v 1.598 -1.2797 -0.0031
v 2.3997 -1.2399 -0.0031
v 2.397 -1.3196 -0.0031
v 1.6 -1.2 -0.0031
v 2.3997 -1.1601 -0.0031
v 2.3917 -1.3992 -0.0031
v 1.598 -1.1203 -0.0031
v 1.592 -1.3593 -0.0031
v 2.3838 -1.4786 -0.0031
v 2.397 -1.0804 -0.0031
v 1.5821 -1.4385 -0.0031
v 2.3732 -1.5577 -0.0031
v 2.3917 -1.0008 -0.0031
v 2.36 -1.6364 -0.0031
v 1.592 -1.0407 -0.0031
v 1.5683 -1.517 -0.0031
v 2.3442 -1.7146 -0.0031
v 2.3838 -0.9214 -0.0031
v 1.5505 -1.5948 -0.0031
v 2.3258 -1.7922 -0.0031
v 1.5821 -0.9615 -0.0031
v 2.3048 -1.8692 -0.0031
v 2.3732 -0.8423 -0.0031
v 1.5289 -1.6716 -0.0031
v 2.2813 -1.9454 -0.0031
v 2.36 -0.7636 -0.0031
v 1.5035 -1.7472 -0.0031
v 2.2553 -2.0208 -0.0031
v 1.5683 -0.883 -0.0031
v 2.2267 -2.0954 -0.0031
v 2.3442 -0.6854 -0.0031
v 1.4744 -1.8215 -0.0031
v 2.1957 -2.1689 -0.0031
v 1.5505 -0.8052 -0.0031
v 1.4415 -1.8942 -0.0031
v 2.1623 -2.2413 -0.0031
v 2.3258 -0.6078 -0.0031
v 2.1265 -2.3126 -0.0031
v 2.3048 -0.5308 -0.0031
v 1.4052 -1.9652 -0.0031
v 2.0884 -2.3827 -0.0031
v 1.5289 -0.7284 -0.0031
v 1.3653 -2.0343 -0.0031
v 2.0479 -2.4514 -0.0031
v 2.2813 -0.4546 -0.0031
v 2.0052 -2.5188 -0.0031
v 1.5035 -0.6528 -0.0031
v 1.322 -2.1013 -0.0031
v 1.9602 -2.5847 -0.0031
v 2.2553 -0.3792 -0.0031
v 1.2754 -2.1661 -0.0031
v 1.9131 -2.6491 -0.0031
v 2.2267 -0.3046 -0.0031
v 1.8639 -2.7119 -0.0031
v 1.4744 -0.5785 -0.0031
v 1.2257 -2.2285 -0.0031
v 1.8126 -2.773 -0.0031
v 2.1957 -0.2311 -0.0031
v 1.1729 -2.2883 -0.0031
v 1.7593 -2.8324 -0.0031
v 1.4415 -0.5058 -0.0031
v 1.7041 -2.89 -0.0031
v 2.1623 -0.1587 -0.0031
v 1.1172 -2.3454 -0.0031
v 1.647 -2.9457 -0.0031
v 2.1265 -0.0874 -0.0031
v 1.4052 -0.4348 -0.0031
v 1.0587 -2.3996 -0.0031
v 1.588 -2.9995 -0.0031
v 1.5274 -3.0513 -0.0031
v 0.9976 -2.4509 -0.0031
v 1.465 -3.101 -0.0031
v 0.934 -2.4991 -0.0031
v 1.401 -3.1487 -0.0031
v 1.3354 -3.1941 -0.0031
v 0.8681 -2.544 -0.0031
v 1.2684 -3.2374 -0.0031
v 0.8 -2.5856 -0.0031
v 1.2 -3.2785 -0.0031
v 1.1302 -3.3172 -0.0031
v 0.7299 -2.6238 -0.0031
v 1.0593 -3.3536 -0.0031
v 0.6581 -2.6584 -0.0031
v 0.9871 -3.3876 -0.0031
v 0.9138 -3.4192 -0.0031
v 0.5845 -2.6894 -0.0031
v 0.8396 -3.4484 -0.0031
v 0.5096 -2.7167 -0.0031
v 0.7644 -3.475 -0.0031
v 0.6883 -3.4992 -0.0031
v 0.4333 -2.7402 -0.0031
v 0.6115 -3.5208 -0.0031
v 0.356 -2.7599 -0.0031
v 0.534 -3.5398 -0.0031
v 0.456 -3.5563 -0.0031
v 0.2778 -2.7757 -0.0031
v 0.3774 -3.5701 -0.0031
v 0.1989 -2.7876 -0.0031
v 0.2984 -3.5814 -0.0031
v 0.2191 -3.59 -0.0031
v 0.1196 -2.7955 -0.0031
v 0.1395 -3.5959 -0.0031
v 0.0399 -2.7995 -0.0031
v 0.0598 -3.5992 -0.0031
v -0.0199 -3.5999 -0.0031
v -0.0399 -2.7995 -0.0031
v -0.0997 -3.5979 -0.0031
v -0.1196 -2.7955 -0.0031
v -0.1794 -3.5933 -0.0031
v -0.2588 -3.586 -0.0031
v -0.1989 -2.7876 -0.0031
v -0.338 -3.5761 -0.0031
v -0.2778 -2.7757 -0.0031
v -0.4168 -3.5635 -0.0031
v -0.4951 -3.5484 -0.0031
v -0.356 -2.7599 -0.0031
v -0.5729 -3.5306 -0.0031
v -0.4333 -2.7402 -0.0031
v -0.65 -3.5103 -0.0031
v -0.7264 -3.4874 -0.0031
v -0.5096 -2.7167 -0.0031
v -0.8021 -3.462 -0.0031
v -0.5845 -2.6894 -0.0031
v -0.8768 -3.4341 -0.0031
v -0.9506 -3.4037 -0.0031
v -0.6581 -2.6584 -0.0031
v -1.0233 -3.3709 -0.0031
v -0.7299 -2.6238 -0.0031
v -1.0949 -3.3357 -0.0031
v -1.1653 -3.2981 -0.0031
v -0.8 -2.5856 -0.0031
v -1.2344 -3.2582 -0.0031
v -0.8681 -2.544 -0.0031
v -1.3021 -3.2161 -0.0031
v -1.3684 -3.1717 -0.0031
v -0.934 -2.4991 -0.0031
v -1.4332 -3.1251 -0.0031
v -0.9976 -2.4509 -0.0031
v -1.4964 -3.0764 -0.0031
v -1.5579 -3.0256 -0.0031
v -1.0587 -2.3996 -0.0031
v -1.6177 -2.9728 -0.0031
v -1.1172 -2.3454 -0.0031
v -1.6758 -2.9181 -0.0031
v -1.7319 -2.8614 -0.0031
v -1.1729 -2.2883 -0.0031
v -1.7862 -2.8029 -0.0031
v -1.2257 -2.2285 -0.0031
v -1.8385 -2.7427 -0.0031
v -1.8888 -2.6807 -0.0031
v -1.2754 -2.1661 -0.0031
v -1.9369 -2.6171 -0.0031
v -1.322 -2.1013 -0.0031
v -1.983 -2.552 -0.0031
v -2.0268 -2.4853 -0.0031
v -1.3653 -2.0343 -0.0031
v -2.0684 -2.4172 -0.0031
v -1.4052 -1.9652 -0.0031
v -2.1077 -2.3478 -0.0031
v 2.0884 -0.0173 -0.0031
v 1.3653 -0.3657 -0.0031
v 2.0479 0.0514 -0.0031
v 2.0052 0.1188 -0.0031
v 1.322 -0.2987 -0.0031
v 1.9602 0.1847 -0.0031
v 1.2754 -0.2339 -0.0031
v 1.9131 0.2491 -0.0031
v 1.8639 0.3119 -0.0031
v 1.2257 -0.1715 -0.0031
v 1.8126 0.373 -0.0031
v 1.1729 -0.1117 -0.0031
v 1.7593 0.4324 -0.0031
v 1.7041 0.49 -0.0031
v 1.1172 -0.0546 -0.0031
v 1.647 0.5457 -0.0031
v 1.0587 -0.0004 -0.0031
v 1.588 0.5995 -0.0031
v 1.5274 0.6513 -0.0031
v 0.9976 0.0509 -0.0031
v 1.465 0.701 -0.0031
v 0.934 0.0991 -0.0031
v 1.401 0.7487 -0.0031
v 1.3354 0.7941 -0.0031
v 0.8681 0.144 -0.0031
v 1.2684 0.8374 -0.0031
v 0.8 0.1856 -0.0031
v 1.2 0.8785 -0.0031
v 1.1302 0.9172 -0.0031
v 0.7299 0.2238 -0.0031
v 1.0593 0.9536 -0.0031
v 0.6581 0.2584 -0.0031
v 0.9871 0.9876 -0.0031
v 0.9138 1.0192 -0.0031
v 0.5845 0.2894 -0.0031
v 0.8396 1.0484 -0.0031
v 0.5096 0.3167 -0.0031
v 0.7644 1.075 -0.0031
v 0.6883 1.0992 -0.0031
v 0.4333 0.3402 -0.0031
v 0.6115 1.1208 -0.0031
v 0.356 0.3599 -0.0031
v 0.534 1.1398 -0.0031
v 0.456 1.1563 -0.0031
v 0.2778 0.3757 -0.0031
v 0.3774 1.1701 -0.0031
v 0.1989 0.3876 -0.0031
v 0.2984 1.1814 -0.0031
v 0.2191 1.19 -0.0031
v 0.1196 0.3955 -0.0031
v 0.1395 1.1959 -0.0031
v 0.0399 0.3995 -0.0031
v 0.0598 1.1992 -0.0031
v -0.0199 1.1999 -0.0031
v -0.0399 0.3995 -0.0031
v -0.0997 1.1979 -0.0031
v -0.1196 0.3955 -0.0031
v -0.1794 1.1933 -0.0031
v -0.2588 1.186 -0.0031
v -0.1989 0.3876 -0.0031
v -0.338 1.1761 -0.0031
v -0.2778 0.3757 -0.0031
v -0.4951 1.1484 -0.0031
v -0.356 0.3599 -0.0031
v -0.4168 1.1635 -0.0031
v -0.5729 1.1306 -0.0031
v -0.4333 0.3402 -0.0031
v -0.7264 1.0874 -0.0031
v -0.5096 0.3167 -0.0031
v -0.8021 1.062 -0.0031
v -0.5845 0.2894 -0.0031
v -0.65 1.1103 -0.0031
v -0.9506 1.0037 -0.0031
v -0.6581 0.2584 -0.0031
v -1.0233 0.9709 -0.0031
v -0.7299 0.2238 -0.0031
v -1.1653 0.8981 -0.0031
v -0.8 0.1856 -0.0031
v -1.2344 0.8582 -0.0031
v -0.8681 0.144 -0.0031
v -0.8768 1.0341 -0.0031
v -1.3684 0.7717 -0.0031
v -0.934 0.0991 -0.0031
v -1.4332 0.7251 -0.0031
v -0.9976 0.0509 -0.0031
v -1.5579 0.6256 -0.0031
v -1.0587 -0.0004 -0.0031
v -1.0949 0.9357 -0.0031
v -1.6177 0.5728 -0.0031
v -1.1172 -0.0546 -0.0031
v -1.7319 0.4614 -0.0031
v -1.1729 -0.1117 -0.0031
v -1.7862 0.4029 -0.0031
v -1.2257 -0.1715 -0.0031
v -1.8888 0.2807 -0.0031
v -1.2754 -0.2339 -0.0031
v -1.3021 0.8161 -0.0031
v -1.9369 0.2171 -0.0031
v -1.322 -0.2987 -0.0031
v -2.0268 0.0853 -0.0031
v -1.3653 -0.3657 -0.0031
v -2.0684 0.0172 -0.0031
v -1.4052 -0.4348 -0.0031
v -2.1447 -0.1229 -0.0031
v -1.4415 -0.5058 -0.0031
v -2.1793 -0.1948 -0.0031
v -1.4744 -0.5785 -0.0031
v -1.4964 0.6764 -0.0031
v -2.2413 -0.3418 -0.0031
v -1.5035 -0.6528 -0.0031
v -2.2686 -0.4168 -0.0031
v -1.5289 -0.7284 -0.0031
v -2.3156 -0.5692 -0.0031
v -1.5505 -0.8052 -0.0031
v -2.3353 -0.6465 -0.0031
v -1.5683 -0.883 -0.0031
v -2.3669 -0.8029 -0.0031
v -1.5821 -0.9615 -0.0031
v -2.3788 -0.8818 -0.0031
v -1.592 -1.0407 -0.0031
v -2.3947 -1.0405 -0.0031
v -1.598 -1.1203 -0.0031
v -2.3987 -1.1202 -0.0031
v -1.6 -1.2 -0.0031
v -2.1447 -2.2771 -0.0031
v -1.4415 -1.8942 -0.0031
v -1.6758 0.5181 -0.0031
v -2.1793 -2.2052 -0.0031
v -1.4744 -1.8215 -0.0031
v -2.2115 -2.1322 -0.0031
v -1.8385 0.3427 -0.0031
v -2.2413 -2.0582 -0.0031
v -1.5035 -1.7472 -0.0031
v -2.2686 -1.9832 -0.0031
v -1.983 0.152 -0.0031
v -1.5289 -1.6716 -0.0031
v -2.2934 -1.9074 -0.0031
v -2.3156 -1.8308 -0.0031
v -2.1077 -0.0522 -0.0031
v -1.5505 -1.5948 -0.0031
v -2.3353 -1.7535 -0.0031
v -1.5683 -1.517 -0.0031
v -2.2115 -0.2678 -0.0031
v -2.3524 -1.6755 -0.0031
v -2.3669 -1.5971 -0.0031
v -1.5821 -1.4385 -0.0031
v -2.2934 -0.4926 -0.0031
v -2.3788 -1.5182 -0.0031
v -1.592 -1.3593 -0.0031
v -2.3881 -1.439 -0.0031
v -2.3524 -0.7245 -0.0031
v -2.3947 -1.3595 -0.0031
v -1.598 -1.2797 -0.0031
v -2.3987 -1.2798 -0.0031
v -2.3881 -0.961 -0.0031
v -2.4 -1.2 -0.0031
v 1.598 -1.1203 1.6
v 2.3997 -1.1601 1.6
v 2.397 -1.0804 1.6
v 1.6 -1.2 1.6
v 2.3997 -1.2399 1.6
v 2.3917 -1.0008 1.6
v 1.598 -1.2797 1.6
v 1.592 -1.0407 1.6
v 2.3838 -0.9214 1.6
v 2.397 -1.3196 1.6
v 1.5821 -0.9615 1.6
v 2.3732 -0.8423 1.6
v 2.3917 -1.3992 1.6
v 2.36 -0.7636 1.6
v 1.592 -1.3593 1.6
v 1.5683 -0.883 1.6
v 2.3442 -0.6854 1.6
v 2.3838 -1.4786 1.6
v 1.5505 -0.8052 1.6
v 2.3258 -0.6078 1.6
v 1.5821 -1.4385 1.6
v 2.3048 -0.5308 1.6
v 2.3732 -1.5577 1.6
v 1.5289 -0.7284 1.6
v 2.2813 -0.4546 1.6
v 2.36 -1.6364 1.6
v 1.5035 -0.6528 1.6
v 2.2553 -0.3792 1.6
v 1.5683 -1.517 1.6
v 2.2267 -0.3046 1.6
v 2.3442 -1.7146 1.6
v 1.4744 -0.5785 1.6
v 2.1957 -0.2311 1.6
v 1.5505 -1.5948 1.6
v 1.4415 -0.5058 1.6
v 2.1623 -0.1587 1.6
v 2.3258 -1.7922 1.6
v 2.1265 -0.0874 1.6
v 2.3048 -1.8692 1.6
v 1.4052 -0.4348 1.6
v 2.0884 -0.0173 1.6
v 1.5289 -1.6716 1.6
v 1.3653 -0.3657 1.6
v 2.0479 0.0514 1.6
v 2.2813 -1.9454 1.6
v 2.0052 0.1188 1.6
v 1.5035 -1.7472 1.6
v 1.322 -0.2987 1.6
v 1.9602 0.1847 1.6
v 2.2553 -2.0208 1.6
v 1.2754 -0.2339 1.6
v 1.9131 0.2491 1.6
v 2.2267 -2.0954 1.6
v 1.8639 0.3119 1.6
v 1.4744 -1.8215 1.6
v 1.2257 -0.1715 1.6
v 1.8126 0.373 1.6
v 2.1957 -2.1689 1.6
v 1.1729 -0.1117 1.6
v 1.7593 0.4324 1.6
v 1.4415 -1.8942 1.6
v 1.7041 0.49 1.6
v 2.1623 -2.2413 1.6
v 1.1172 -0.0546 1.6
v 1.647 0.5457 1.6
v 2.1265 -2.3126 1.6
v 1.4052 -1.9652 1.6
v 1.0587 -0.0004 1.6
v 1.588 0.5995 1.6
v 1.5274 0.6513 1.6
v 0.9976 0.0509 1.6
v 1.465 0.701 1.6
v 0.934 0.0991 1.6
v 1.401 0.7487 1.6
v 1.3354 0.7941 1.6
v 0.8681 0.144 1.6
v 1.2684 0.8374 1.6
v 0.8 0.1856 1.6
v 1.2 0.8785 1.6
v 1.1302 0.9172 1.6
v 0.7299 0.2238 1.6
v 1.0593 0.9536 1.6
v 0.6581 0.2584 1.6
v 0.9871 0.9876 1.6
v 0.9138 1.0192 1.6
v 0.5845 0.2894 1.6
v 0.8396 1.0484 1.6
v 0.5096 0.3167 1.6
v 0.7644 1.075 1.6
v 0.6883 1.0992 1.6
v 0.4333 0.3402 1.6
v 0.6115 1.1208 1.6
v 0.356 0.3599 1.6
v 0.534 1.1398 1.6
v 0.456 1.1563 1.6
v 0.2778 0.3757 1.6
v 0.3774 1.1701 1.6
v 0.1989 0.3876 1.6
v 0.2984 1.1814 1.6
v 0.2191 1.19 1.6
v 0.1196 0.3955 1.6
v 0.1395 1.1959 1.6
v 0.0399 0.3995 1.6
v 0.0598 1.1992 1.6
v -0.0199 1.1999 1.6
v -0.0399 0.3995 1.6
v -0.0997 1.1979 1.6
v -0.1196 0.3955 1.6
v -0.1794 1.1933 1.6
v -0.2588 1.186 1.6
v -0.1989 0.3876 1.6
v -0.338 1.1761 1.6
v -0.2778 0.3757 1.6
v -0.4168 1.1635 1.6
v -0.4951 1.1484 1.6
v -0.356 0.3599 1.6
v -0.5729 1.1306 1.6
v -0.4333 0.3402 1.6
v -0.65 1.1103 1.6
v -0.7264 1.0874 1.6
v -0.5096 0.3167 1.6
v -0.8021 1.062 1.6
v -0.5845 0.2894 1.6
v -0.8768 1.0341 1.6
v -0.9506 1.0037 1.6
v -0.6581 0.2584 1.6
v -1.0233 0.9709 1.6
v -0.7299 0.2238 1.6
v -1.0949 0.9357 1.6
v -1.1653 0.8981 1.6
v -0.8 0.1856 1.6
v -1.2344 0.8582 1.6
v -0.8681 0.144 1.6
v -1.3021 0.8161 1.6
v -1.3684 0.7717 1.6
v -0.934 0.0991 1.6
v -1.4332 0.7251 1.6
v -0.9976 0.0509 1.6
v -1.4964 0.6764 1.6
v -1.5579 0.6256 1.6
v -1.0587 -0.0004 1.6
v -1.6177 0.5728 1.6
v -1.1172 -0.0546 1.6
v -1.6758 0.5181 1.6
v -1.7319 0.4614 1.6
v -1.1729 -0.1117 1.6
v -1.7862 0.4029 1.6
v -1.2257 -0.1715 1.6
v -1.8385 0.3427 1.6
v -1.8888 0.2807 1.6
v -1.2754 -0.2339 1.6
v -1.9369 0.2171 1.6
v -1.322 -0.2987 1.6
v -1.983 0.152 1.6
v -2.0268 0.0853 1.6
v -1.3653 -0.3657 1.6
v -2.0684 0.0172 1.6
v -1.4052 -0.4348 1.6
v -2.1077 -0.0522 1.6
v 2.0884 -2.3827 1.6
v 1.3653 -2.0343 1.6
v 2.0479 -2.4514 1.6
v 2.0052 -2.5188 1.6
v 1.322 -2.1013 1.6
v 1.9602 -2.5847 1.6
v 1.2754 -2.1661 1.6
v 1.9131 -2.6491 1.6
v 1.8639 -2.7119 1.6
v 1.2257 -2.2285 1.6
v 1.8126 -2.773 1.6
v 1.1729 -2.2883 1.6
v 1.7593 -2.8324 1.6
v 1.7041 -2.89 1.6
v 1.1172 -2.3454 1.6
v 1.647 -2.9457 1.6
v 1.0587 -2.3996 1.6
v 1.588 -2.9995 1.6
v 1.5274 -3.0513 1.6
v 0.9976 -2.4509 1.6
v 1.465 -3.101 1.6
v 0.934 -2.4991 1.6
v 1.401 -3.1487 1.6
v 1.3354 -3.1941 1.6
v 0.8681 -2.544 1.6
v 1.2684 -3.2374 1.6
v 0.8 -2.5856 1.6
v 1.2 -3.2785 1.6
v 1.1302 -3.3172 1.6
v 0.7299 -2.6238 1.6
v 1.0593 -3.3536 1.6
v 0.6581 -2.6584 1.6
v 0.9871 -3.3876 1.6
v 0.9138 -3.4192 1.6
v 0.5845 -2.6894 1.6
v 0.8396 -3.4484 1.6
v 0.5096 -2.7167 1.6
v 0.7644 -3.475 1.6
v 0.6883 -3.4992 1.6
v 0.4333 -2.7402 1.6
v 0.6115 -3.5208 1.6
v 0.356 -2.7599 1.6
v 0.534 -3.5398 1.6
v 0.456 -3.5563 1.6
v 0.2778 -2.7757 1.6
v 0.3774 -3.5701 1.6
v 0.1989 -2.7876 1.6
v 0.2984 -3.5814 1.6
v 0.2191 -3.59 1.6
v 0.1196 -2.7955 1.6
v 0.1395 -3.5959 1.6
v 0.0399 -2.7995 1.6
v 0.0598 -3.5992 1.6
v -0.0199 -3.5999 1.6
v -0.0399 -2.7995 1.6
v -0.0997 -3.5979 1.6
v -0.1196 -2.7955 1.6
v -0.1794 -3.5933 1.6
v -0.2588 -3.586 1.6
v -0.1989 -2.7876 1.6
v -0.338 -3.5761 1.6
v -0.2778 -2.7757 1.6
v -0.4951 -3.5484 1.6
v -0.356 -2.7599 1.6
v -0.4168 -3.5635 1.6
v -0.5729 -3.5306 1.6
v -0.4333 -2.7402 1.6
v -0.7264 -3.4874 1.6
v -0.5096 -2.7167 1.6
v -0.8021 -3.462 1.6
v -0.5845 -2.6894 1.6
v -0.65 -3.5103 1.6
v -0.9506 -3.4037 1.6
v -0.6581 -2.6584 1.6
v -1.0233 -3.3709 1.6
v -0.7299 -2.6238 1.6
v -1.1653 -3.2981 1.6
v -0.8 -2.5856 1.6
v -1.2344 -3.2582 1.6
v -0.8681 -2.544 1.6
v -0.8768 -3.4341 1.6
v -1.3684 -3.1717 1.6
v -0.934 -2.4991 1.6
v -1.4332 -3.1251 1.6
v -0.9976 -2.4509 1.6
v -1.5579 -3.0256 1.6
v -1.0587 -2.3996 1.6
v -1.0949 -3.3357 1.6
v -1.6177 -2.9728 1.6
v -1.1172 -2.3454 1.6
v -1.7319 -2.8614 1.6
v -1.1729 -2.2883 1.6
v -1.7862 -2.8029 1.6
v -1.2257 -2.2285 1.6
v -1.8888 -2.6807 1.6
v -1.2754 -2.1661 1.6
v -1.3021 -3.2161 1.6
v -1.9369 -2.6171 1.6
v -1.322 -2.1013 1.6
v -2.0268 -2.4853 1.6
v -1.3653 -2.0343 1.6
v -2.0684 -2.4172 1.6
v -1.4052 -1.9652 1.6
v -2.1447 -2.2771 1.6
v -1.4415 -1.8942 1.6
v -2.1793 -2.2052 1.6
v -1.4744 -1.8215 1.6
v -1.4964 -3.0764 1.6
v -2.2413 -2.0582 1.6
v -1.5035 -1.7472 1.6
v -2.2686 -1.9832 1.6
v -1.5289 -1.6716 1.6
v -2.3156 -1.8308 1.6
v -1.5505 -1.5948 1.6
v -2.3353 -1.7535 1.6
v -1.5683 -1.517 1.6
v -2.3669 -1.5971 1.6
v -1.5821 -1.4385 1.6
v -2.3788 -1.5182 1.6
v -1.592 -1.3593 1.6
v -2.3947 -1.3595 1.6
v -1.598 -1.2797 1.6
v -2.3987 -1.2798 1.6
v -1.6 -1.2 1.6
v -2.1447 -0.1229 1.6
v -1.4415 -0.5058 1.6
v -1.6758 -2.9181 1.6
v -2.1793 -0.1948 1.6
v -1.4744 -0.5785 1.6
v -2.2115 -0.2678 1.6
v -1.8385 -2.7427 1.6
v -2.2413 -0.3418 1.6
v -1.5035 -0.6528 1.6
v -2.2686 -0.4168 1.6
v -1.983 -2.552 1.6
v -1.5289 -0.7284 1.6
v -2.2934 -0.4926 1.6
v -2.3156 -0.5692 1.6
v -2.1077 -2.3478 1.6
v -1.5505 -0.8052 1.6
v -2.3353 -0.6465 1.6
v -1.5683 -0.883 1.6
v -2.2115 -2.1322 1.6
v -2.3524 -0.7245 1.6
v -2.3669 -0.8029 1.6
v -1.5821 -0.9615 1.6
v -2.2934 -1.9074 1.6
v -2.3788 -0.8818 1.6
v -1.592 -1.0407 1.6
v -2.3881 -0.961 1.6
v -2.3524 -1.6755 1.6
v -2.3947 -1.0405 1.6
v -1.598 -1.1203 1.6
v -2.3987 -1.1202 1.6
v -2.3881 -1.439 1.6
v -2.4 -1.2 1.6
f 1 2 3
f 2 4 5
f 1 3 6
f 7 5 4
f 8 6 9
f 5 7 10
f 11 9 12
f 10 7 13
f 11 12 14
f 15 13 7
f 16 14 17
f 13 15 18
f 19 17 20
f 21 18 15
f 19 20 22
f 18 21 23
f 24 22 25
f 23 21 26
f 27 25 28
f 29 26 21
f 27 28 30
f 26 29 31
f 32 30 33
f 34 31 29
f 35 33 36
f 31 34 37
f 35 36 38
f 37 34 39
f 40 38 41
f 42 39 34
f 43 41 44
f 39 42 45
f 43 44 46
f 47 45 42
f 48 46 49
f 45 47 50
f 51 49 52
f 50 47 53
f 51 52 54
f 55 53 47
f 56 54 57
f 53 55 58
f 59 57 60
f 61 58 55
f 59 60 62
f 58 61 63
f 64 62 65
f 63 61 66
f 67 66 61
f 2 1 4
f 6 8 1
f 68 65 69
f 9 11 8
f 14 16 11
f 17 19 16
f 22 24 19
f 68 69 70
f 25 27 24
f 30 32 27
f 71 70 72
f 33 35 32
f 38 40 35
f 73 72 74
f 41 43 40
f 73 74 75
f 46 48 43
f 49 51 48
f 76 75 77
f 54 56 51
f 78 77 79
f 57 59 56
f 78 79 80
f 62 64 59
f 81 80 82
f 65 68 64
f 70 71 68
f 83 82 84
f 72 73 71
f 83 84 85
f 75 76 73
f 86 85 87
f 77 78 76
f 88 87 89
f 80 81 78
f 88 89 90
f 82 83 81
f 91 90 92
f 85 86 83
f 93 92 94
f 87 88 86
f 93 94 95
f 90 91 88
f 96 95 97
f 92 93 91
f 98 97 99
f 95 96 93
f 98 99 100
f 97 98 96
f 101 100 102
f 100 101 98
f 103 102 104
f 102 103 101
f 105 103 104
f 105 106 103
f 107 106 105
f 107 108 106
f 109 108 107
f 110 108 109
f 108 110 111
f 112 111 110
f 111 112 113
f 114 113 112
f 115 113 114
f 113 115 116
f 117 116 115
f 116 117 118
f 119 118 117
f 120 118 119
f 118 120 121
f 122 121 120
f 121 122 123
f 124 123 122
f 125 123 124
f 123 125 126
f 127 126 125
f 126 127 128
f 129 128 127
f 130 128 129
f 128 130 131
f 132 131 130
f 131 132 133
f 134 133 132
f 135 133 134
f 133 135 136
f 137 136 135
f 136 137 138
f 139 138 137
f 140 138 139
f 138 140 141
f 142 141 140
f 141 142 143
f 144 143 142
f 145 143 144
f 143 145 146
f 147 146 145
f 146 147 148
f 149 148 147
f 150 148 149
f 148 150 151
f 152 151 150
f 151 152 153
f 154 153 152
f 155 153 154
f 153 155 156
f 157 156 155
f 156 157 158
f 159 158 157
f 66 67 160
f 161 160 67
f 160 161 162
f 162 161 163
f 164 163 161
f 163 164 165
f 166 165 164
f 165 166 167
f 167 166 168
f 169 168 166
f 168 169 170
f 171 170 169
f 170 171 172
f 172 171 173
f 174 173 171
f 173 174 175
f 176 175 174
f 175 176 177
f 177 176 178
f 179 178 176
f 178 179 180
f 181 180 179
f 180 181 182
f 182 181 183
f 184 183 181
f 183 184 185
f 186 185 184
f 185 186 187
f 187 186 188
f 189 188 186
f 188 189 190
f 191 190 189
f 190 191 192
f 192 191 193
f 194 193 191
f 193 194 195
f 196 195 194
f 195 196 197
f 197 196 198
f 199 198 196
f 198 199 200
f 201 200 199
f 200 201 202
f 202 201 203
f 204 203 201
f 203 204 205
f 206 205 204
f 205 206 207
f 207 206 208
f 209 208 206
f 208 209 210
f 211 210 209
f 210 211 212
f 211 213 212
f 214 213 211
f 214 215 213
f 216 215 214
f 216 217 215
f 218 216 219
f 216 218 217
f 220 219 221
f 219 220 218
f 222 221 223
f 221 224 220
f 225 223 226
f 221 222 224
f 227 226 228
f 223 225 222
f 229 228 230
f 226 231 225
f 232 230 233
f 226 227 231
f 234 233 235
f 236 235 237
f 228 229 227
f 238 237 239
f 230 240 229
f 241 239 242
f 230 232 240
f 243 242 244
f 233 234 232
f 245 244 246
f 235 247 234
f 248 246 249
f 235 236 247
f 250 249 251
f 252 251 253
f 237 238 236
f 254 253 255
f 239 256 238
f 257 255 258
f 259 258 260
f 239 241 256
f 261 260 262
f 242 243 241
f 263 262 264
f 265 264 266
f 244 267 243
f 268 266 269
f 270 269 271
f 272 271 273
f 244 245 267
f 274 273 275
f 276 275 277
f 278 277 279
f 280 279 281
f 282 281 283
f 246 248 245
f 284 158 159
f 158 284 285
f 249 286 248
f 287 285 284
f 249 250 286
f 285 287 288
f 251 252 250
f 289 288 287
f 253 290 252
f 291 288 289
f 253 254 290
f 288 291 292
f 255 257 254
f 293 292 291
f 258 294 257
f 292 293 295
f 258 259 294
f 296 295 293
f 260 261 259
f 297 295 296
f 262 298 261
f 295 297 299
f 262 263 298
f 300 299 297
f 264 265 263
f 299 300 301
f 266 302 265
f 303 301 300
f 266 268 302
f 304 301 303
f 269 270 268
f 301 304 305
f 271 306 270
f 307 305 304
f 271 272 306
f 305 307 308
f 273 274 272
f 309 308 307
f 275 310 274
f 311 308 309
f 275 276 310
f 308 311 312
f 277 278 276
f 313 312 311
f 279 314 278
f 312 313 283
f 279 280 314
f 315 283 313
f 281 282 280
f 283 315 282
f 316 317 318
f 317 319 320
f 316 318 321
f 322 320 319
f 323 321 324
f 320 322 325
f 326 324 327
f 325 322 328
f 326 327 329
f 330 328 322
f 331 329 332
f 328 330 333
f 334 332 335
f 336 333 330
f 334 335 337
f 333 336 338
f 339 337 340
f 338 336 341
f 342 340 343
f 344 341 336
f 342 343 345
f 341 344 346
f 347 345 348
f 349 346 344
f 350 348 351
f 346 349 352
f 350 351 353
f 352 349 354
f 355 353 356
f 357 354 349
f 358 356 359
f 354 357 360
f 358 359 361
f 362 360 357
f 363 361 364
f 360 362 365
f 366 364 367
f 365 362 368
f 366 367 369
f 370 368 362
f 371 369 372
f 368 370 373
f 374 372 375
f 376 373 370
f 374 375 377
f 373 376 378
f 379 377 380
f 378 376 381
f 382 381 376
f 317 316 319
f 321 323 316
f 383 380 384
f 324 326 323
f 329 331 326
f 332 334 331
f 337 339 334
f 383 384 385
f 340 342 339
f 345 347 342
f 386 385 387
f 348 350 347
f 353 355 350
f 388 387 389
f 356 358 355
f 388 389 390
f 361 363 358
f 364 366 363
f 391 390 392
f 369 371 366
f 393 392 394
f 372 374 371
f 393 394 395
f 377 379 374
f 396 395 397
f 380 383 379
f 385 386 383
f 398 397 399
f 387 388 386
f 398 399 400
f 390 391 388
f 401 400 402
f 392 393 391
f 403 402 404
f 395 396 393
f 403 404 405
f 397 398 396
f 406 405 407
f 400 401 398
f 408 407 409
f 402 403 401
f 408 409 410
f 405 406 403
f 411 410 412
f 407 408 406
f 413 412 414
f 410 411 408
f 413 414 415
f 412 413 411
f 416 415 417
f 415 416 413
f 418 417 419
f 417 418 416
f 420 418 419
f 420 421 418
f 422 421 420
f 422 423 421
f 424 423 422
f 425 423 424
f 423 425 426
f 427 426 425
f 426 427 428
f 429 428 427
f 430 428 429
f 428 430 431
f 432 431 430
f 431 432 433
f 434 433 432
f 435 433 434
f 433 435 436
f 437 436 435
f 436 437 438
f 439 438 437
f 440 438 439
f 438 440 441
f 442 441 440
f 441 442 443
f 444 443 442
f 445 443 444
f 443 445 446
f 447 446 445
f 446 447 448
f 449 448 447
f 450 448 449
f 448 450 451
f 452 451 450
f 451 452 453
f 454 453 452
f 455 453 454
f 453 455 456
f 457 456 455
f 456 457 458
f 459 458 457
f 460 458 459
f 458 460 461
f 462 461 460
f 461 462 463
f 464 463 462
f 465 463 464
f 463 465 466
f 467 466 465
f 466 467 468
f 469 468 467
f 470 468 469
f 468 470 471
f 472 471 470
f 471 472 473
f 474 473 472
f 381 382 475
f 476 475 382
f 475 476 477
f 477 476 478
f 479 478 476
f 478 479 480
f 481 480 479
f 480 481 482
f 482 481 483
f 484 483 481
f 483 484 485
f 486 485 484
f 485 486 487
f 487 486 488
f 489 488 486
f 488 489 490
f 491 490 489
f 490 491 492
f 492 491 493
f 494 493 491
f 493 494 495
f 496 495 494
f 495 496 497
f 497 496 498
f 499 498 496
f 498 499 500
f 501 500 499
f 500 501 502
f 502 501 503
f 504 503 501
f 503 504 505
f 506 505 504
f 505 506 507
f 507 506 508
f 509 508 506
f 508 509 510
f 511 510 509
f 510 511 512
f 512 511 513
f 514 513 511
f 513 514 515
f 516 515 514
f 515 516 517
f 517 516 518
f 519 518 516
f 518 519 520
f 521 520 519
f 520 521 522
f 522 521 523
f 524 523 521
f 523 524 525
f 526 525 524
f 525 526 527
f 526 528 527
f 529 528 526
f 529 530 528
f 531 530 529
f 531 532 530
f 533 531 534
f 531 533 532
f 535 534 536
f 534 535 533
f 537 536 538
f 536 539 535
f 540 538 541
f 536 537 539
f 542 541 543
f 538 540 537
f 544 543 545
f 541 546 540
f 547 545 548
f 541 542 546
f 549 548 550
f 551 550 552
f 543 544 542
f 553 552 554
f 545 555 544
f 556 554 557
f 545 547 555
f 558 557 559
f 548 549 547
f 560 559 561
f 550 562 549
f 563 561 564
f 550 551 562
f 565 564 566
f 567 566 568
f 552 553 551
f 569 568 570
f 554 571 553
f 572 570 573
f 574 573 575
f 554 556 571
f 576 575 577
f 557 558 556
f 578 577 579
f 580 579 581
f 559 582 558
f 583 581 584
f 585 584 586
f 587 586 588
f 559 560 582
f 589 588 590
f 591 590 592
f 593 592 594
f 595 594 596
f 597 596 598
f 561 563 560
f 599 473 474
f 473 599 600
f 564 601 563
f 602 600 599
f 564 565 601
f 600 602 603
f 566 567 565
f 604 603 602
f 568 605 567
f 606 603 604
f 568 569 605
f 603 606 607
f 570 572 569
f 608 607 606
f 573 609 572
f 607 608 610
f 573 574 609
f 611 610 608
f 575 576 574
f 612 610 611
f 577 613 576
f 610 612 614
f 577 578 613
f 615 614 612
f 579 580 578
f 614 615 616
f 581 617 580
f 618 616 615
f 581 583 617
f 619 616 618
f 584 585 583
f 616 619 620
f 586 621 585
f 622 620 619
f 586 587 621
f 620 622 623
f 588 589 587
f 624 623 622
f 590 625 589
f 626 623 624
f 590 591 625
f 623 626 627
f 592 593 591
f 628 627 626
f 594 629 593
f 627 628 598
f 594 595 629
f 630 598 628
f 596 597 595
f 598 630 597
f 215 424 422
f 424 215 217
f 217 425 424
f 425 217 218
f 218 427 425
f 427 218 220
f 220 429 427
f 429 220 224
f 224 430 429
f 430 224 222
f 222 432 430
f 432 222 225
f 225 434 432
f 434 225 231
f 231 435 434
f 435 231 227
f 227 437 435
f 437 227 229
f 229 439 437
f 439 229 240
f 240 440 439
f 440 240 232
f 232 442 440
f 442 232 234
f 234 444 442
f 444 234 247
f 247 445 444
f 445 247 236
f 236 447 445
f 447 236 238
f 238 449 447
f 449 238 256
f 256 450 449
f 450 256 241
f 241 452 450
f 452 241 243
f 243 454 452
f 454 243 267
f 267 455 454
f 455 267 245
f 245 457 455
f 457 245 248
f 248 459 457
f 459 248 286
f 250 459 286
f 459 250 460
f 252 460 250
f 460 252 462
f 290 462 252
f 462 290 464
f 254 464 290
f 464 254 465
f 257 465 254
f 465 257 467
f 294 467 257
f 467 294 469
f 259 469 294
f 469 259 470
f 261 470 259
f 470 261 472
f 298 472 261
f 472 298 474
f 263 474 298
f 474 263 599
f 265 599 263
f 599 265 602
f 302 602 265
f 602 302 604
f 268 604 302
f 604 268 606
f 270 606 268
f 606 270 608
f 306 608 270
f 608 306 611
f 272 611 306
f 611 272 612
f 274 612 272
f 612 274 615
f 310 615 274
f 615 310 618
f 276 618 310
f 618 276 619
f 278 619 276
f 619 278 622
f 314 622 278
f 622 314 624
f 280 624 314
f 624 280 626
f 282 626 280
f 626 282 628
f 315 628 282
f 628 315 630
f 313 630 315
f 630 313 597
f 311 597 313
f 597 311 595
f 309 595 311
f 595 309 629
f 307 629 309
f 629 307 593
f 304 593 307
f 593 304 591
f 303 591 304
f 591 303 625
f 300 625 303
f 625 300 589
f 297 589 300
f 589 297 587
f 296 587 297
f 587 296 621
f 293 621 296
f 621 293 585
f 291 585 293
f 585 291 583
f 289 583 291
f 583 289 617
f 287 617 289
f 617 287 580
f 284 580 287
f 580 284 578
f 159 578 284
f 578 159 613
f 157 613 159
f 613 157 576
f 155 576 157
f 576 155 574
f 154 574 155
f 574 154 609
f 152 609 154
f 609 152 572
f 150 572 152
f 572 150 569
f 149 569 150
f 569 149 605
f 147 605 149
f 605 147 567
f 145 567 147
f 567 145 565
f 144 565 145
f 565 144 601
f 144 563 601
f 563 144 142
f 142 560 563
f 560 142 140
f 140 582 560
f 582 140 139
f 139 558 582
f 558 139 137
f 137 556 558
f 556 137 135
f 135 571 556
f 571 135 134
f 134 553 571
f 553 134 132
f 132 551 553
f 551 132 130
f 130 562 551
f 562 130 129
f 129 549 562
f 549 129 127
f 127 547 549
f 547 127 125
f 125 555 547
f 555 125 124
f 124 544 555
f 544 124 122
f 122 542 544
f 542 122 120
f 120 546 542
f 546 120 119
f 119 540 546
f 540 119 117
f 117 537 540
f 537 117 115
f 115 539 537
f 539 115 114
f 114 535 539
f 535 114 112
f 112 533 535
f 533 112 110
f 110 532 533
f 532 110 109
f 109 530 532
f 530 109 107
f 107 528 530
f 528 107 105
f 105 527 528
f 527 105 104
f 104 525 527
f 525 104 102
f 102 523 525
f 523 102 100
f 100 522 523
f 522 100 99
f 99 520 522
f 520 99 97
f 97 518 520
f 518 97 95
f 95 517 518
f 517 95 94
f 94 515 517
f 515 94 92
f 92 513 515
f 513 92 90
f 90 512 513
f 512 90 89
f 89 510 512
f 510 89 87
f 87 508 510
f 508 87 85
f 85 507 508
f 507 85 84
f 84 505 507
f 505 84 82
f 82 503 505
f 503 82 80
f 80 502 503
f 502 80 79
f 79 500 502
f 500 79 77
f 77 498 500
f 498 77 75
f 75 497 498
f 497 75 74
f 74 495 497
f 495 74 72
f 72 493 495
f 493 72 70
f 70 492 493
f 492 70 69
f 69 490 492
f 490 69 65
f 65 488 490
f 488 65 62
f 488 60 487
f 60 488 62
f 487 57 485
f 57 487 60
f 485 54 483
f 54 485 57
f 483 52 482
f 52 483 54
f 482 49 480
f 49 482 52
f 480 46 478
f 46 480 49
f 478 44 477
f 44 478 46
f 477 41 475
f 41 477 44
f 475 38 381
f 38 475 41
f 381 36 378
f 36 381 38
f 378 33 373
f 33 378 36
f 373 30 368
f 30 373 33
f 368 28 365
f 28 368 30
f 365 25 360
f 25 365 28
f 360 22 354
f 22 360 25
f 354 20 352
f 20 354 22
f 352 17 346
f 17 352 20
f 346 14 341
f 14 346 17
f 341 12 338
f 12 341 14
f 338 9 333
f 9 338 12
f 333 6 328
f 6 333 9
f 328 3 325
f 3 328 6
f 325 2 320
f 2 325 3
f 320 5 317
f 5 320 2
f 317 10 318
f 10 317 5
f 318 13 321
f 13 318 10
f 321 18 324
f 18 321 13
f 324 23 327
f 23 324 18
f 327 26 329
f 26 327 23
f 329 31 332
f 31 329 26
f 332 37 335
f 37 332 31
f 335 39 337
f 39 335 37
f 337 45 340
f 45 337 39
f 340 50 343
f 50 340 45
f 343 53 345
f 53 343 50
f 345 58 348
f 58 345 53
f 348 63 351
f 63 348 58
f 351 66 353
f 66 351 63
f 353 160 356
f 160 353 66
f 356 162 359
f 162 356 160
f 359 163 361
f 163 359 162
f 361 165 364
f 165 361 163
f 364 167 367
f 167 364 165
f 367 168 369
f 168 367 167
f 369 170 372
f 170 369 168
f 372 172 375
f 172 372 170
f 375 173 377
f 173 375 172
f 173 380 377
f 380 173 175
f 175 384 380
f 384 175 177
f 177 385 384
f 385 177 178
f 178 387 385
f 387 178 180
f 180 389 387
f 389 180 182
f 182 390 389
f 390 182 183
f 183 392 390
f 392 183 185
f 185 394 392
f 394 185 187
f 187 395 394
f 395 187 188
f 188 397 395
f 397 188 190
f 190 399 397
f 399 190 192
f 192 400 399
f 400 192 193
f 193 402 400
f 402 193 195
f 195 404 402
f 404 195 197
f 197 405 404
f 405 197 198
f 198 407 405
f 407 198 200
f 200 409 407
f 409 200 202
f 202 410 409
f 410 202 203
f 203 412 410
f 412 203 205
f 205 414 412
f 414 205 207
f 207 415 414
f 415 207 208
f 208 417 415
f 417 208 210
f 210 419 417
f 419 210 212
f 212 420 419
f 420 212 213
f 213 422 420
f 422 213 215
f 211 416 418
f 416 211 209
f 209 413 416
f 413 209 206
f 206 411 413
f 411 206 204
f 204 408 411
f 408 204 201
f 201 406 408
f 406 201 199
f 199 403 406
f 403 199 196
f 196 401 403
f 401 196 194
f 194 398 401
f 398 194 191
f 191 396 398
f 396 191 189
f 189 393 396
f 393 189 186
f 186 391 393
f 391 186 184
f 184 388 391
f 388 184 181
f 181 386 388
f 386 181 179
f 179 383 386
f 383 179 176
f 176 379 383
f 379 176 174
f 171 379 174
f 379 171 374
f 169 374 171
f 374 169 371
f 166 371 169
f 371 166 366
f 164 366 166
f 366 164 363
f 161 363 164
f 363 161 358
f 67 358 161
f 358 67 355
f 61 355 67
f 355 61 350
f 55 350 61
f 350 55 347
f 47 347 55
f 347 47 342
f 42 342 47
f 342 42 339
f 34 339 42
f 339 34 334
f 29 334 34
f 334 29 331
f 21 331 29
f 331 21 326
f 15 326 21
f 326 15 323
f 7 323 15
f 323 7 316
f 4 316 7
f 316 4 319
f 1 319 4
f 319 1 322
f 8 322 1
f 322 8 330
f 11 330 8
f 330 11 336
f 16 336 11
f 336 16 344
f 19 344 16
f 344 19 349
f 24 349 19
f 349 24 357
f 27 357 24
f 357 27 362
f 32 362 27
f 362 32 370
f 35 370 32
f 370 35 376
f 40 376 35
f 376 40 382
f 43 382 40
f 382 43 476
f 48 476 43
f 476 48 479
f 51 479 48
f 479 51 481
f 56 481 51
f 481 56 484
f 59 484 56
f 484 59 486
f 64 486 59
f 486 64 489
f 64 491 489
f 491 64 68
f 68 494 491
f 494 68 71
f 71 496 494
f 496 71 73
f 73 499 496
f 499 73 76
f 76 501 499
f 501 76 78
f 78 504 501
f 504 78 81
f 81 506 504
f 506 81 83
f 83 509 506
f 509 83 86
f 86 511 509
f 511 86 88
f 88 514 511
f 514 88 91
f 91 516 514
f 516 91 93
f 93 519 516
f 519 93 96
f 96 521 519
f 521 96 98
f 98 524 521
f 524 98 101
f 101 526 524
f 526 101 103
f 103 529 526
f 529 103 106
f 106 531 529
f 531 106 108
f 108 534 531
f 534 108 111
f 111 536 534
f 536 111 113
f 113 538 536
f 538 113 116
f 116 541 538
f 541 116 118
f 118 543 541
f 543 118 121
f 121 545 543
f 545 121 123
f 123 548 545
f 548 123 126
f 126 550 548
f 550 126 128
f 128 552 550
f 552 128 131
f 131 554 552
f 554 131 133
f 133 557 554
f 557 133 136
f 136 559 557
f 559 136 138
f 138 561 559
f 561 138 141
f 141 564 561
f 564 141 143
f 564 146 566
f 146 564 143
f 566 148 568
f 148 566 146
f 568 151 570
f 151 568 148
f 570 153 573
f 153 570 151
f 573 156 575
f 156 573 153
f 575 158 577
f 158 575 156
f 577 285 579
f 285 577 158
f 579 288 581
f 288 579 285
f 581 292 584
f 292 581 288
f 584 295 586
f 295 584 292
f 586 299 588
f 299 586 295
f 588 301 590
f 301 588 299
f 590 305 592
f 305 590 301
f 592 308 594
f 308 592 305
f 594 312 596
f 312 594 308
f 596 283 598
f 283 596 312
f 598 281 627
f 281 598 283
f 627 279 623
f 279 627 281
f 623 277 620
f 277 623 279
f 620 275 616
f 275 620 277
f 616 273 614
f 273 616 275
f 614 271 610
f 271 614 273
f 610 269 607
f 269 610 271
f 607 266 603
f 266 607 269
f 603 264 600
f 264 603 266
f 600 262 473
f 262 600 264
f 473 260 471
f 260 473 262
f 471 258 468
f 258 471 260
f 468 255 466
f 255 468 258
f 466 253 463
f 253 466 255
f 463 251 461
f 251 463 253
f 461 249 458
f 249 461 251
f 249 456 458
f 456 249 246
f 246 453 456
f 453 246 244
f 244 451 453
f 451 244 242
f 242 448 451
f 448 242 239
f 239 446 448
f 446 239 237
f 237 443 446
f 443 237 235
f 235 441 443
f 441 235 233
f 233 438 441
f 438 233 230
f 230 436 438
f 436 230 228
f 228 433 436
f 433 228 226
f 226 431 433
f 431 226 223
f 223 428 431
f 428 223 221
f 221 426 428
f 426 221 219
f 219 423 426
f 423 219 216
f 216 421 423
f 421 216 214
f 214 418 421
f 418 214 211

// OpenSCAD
use <../lib.scad>
use <s/92198p01s03.scad>
use <s/92198p05s01.scad>
use <s/92198s01.scad>
$fa=1; $fs=0.2;
function ldraw_lib__92198p07(realsolid=false) = [
// 0 Figure Friends Female Head with Brown Eyes, Pink Lips and Closed Mouth Pattern
// 0 Name: 92198p07.dat
// 0 Author: Philippe Hurbain [Philo]
// 0 !LDRAW_ORG Part UPDATE 2014-02
// 0 !LICENSE Licensed under CC BY 2.0 and CC BY 4.0 : see CAreadme.txt
// 
// 0 BFC CERTIFY CCW
  [0,"BFC","CERTIFY"],
  [0,"BFC","CCW"],
// 
// 0 !KEYWORDS Maya
// 
// 0 !HISTORY 2014-12-23 [PTadmin] Official Update 2014-02
// 
// 
// 1 16 0 0 0 1 0 0 0 1 0 0 0 1 s\92198s01.dat
  [1,16,0,0,0,1,0,0,0,1,0,0,0,1, ldraw_lib__s__92198s01(realsolid)],
// 1 16 0 0 0 1 0 0 0 1 0 0 0 1 s\92198p05s01.dat
  [1,16,0,0,0,1,0,0,0,1,0,0,0,1, ldraw_lib__s__92198p05s01(realsolid)],
// 1 6 0 0 0 1 0 0 0 1 0 0 0 1 s\92198p01s03.dat
  [1,6,0,0,0,1,0,0,0,1,0,0,0,1, ldraw_lib__s__92198p01s03(realsolid)],
// 3 16 4.511 15.296 -14.246 4.08 20.01 -14.07 5.25 15.35 -13.789
  [3,16,4.511,15.296,-14.246,4.08,20.01,-14.07,5.25,15.35,-13.789],
// 3 16 -5.25 15.35 -13.789 -4.08 20.01 -14.07 -4.511 15.296 -14.246
  [3,16,-5.25,15.35,-13.789,-4.08,20.01,-14.07,-4.511,15.296,-14.246],
// 4 16 9.32 14.31 -11.4 7.3 14.75 -12.593 6.8 15.05 -12.87 4.08 20.01 -14.07
  [4,16,9.32,14.31,-11.4,7.3,14.75,-12.593,6.8,15.05,-12.87,4.08,20.01,-14.07],
// 3 16 6.1 15.25 -13.279 5.25 15.35 -13.789 4.08 20.01 -14.07
  [3,16,6.1,15.25,-13.279,5.25,15.35,-13.789,4.08,20.01,-14.07],
// 3 16 6.8 15.05 -12.87 6.1 15.25 -13.279 4.08 20.01 -14.07
  [3,16,6.8,15.05,-12.87,6.1,15.25,-13.279,4.08,20.01,-14.07],
// 3 16 9.32 14.31 -11.4 4.08 20.01 -14.07 7.78 19.34 -11.69
  [3,16,9.32,14.31,-11.4,4.08,20.01,-14.07,7.78,19.34,-11.69],
// 4 16 -6.8 15.05 -12.87 -7.3 14.75 -12.593 -9.32 14.31 -11.4 -4.08 20.01 -14.07
  [4,16,-6.8,15.05,-12.87,-7.3,14.75,-12.593,-9.32,14.31,-11.4,-4.08,20.01,-14.07],
// 3 16 -4.08 20.01 -14.07 -5.25 15.35 -13.789 -6.1 15.25 -13.279
  [3,16,-4.08,20.01,-14.07,-5.25,15.35,-13.789,-6.1,15.25,-13.279],
// 3 16 -4.08 20.01 -14.07 -6.1 15.25 -13.279 -6.8 15.05 -12.87
  [3,16,-4.08,20.01,-14.07,-6.1,15.25,-13.279,-6.8,15.05,-12.87],
// 3 16 -7.78 19.34 -11.69 -4.08 20.01 -14.07 -9.32 14.31 -11.4
  [3,16,-7.78,19.34,-11.69,-4.08,20.01,-14.07,-9.32,14.31,-11.4],
];
module ldraw_lib__92198p07(step=0, col=false, unit=2/5, alt=false, line=0.2, solid=!$preview)
    makepoly(ldraw_lib__92198p07(solid), step=step, col=col, unit=unit, alt=alt, line=line, solid=solid);
ldraw_lib__92198p07(line=0.2);
